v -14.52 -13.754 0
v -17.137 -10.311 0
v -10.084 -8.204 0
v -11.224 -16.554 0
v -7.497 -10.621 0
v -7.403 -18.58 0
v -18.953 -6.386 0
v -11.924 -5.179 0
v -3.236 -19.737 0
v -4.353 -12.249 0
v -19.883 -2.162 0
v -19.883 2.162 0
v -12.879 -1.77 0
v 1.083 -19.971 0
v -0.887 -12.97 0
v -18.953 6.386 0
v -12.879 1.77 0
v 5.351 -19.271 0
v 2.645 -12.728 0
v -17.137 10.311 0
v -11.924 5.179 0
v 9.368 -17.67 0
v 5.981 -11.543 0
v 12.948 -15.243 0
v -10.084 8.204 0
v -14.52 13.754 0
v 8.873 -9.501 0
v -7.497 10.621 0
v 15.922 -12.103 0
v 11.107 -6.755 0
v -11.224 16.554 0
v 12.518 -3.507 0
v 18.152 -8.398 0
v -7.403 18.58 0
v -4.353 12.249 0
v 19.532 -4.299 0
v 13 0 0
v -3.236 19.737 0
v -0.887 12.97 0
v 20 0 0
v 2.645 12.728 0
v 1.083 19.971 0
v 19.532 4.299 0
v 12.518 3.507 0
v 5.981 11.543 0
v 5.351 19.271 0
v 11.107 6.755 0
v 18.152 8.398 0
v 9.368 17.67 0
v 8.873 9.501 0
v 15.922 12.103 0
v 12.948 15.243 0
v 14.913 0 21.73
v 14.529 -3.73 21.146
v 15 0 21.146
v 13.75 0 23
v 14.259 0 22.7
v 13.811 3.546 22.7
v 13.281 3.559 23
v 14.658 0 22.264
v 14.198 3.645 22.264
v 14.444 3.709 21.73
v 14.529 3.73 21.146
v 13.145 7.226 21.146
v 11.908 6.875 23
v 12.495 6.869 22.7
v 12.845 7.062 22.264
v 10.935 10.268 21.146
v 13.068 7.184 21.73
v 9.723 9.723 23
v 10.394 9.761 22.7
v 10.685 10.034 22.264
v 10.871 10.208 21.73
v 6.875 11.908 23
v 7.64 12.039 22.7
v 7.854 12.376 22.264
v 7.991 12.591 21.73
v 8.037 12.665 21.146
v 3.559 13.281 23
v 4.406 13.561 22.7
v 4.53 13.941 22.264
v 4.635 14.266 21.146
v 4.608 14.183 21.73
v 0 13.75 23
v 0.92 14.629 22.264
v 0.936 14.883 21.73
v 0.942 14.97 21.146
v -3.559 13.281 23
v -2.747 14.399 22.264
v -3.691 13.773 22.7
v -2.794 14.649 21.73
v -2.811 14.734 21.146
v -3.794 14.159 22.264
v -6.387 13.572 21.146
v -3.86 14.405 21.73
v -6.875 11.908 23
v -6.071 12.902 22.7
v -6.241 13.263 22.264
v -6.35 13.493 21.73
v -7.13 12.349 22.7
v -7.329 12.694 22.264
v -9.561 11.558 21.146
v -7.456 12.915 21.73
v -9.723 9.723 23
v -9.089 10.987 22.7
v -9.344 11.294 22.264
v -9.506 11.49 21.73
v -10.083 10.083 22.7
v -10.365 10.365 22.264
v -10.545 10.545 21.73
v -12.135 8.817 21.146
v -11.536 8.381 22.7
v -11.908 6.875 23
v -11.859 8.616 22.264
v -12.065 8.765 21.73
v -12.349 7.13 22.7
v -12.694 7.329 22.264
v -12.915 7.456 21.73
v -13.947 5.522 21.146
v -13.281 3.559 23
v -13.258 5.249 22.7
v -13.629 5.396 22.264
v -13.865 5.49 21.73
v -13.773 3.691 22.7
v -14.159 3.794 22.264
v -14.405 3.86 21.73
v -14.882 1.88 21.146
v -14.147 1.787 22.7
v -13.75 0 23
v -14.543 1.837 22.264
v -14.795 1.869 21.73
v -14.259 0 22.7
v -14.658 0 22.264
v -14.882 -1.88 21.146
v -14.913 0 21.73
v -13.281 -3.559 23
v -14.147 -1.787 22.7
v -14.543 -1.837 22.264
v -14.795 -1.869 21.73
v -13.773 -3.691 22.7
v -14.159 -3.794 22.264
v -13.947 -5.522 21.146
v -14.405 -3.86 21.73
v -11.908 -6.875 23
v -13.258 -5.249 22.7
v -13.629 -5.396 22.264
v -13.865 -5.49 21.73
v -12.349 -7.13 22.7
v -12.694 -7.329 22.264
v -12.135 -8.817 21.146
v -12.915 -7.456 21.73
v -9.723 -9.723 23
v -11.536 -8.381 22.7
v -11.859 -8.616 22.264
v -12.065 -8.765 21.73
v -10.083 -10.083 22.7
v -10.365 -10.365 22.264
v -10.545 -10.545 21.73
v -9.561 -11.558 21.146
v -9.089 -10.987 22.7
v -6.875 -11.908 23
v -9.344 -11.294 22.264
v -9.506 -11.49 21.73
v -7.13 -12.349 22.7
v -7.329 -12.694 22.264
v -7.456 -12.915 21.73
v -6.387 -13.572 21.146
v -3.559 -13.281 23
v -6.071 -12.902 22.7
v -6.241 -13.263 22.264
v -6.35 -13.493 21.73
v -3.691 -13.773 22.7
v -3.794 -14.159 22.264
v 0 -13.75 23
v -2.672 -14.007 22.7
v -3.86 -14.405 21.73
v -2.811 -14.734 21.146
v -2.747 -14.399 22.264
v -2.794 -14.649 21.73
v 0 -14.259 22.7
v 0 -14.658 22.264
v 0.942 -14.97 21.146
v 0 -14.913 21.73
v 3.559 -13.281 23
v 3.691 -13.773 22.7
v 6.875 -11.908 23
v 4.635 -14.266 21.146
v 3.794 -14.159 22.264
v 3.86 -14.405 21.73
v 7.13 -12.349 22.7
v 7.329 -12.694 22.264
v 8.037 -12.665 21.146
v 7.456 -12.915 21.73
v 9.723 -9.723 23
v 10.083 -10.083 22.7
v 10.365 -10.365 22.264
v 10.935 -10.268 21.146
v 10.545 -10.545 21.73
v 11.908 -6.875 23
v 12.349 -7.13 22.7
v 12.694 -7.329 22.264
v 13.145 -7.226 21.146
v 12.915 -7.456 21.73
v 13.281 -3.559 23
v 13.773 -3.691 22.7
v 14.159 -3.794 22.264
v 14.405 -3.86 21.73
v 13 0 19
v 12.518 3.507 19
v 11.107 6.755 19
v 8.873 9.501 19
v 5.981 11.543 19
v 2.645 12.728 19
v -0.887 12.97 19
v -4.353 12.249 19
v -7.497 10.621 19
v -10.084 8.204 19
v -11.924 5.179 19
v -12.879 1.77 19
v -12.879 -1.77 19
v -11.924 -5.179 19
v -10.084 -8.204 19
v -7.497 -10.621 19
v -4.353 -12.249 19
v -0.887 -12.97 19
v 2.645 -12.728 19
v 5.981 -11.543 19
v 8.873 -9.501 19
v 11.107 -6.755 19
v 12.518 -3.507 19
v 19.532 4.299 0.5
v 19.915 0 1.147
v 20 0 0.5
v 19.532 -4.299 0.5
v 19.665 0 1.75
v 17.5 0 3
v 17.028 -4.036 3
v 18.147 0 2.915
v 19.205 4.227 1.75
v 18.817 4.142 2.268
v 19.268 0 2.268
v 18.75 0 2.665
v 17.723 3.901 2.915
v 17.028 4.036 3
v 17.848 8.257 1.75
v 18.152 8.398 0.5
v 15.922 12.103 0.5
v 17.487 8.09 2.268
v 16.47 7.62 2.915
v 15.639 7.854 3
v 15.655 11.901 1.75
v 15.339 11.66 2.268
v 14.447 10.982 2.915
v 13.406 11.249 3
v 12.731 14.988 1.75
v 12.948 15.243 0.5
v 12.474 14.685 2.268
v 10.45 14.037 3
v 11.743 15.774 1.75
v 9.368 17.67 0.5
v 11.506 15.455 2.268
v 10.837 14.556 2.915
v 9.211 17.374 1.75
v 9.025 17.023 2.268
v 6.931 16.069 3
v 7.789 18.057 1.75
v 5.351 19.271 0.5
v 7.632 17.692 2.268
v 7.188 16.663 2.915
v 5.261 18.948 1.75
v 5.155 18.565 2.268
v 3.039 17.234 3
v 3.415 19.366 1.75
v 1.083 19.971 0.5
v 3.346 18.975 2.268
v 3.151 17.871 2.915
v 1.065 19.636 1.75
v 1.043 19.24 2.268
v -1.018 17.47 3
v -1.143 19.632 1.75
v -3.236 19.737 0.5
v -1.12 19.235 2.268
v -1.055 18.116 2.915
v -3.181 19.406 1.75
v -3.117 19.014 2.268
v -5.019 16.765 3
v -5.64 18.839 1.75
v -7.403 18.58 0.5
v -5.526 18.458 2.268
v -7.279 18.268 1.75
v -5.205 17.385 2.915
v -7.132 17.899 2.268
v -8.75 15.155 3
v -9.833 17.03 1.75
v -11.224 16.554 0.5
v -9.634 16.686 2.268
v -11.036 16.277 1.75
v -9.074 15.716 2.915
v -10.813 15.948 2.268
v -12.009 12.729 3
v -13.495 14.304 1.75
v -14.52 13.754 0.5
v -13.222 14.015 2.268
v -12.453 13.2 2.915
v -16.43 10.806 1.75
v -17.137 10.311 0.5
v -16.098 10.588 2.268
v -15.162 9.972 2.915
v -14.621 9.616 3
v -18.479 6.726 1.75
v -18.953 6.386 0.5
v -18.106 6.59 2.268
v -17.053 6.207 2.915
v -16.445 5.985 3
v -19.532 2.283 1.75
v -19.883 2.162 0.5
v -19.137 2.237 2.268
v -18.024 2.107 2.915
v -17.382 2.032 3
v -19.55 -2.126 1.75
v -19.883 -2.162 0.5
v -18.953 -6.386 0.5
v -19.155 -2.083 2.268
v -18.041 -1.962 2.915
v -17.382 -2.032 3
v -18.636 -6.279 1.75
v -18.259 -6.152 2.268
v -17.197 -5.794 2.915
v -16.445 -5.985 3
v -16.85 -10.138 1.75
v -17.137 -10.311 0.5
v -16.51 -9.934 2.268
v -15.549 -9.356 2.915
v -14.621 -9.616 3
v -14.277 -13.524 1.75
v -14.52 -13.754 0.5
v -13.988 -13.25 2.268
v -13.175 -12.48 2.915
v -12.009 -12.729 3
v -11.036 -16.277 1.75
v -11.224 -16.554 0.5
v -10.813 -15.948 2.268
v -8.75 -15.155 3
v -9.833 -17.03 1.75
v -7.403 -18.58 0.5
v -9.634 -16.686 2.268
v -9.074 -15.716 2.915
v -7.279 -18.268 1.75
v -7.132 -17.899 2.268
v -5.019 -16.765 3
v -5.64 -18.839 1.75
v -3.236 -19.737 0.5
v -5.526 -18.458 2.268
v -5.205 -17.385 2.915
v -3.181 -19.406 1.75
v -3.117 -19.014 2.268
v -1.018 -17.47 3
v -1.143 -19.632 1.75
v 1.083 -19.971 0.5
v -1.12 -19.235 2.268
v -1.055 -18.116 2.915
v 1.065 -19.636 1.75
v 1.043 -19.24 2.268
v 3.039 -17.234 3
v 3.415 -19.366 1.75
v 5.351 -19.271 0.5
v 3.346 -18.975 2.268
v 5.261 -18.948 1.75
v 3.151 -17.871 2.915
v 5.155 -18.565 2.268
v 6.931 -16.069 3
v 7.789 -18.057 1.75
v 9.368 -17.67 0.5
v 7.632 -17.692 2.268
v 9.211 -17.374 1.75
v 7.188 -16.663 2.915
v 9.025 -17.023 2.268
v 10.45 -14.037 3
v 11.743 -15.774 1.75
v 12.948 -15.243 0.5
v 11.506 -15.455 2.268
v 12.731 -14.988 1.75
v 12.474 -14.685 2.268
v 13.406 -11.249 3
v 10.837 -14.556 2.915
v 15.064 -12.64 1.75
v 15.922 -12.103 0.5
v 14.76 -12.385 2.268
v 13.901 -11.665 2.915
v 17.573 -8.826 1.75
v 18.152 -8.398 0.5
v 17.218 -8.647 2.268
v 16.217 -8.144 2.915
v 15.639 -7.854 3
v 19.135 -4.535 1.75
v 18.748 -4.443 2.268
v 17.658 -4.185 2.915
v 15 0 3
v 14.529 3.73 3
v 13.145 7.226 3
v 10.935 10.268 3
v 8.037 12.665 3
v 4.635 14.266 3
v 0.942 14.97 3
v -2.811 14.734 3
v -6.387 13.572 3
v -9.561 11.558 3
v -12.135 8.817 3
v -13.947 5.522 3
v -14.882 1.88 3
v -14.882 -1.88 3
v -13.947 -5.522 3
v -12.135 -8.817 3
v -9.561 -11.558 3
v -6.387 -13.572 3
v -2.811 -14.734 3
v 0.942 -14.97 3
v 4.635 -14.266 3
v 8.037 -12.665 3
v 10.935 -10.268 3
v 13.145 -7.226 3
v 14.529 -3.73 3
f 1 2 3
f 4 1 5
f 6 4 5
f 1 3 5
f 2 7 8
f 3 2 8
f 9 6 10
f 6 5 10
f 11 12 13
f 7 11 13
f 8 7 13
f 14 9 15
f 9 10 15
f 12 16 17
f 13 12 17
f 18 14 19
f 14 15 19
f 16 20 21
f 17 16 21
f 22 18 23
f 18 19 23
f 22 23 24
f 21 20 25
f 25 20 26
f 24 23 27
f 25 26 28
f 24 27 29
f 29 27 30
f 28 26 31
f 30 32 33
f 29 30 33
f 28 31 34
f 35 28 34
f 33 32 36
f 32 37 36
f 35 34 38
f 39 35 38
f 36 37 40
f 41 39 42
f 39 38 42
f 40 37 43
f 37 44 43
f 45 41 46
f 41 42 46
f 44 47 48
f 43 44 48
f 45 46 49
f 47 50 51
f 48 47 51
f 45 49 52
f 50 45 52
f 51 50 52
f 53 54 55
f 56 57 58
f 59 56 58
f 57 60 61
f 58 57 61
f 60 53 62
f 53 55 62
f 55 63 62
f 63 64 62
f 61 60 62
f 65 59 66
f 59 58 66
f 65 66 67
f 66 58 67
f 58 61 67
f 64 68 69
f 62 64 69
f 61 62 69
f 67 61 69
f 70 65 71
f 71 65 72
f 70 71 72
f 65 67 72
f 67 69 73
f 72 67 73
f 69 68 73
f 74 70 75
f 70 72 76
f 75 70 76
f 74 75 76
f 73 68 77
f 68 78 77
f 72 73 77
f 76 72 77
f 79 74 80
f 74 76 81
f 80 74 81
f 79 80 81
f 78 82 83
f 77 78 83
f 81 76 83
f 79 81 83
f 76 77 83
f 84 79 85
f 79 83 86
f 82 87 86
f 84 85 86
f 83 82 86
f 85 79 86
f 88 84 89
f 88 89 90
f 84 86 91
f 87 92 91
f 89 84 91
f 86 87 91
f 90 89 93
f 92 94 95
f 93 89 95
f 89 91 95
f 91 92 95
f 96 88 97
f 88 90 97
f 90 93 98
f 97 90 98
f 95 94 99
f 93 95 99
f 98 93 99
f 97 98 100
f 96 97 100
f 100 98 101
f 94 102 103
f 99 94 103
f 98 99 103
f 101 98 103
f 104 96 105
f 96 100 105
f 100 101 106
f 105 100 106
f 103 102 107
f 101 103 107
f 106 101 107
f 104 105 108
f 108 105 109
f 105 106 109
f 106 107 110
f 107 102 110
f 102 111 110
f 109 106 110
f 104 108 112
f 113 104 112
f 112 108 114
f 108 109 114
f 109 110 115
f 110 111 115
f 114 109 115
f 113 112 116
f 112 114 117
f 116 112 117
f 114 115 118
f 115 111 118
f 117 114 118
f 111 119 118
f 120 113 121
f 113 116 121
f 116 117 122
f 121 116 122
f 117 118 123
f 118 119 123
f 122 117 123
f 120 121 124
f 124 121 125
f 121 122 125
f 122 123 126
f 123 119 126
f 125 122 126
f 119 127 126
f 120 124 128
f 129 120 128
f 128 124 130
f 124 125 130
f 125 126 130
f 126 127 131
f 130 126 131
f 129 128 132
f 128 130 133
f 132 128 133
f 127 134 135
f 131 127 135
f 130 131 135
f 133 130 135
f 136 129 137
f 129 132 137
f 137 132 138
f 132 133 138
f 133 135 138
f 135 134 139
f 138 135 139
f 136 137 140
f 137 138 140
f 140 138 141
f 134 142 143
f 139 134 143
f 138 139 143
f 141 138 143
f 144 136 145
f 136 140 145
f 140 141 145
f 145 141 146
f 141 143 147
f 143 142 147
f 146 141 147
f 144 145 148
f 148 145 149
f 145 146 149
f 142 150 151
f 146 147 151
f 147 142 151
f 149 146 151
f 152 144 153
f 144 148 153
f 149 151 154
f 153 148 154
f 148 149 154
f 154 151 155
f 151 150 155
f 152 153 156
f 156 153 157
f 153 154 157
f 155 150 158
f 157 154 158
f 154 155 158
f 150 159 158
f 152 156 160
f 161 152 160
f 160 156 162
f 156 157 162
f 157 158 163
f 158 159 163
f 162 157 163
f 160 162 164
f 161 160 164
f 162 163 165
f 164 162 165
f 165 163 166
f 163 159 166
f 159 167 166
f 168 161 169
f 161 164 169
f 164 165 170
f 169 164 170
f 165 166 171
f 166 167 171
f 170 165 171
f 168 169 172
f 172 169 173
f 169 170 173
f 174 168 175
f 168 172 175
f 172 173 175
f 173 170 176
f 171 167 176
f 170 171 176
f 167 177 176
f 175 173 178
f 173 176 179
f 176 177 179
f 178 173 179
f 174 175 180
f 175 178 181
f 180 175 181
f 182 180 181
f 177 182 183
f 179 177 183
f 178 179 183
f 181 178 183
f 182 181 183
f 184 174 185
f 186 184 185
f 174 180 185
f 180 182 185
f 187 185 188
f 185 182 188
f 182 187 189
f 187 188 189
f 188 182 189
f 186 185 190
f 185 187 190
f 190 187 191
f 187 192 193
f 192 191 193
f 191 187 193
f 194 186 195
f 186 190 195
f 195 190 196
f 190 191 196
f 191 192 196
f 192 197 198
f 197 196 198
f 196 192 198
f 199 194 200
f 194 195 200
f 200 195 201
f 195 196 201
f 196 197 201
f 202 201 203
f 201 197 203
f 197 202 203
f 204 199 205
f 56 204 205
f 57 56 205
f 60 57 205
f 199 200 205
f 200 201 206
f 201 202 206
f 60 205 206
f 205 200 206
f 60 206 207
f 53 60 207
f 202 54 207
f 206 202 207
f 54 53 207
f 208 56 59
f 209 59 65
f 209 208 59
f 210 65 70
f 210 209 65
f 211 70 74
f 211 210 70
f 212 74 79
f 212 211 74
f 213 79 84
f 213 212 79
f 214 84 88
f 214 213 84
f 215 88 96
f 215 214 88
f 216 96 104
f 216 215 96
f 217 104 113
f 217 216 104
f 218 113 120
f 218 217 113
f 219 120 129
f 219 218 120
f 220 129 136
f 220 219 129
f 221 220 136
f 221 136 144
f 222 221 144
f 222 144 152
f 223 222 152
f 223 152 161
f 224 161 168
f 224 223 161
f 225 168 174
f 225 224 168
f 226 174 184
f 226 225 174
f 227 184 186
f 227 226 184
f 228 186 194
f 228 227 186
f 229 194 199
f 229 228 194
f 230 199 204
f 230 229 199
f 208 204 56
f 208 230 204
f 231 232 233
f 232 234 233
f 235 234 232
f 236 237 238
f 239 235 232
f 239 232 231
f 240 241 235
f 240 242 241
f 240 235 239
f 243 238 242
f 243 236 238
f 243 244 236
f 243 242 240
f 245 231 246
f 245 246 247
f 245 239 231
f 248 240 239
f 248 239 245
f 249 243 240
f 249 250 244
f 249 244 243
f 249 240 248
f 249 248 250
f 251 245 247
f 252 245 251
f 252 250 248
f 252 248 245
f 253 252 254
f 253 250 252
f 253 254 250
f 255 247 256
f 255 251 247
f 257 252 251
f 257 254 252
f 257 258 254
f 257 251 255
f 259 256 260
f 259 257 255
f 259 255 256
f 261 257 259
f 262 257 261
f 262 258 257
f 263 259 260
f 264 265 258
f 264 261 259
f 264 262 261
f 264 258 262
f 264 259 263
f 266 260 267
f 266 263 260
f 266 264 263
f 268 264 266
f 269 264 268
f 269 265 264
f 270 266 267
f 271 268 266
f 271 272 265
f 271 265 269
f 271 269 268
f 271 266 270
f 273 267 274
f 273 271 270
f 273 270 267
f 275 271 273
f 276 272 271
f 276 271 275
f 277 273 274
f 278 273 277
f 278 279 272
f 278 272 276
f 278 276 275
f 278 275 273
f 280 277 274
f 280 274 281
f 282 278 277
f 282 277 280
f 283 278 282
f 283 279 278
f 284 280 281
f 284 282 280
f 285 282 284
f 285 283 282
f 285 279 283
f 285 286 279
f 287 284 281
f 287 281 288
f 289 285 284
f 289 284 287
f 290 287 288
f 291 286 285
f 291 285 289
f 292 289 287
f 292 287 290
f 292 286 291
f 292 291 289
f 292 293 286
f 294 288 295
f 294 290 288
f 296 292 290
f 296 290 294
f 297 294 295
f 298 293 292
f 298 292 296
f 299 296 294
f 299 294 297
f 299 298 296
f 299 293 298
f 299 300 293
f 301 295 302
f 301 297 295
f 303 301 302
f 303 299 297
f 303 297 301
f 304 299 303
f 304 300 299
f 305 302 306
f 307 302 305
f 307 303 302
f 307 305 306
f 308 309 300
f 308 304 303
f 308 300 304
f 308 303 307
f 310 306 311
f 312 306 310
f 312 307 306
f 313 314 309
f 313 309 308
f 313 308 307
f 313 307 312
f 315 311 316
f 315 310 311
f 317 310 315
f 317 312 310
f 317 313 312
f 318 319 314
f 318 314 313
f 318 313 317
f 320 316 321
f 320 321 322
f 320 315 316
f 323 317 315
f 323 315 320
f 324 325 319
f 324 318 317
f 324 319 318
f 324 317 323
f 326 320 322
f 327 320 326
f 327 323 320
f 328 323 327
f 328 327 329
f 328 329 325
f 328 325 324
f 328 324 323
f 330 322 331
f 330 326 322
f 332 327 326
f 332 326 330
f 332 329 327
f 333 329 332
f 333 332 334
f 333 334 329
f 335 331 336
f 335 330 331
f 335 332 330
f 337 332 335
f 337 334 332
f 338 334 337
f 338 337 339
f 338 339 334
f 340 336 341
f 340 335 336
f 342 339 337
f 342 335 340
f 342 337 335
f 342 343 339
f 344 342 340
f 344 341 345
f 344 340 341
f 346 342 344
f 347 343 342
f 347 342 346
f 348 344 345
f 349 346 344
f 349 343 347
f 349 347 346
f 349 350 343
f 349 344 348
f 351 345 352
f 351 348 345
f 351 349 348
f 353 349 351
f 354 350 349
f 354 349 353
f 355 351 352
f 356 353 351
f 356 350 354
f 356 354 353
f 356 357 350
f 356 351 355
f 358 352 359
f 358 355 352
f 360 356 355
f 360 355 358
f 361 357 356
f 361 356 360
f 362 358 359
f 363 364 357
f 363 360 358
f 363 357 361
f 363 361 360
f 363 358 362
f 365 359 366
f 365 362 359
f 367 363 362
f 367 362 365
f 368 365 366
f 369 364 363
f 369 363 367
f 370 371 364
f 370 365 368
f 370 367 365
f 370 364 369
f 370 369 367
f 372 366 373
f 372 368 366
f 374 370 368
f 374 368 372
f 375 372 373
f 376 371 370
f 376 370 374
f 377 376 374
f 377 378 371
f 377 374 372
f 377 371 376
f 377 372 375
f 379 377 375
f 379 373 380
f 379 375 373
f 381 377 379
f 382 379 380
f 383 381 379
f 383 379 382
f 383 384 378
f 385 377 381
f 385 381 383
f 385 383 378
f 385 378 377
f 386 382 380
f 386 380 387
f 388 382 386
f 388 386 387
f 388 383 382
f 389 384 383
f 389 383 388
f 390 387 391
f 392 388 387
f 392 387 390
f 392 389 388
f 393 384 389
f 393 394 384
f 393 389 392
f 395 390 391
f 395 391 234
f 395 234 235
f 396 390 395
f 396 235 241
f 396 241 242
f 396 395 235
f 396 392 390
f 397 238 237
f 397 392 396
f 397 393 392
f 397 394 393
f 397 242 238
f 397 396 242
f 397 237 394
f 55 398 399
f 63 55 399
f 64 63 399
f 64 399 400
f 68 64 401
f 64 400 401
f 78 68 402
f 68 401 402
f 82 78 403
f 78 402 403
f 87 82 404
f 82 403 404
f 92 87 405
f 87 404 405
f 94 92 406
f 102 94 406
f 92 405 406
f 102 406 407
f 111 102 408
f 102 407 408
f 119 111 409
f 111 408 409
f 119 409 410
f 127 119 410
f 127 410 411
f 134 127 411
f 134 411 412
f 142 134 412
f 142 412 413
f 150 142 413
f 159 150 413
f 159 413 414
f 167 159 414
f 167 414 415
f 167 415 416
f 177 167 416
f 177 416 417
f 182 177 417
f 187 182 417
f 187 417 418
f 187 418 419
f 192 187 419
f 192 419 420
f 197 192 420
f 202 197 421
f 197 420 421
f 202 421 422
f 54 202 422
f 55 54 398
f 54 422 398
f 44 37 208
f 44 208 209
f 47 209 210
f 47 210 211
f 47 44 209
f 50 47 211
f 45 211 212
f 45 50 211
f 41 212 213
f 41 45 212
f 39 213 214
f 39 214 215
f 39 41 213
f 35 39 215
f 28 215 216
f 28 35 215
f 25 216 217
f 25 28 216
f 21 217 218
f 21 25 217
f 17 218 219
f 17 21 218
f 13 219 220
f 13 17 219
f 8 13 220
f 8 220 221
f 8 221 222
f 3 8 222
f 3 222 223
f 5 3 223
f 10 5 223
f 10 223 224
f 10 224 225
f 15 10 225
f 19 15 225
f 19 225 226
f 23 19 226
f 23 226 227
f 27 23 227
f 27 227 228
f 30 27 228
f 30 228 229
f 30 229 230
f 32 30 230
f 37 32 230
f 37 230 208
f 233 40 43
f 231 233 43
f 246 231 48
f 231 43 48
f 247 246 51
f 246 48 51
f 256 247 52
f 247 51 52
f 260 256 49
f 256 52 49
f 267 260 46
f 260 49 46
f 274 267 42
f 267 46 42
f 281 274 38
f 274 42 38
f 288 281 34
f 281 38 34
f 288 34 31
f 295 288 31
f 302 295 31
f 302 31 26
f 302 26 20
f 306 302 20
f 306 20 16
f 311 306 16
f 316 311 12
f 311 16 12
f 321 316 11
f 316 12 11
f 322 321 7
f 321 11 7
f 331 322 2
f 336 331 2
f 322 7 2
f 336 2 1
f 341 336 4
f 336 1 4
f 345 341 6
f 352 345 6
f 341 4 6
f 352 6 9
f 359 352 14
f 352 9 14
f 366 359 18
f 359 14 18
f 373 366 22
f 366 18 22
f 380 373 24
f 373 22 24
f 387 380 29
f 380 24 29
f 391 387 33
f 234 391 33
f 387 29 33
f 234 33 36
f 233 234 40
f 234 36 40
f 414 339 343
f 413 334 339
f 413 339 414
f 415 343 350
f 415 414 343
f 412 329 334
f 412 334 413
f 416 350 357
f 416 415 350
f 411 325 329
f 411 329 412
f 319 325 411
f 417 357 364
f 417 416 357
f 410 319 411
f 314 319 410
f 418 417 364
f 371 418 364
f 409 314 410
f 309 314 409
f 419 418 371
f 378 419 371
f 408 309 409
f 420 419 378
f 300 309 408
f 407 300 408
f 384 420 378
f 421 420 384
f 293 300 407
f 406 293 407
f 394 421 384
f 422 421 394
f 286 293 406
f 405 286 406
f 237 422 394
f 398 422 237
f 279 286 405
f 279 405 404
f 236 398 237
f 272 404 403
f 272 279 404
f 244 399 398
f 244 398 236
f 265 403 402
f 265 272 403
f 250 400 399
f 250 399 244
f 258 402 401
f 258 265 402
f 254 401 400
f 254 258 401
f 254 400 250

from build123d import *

# Parameters (mm, degrees)
F0_R     = 20
F0_R_2   = 13
F1_DEPTH = 3
F2_R     = 15
F2_R_2   = 13
F3_DEPTH = 20
F4_R     = 2.5
F5_SIZE2 = 4
F5_SIZE  = 0.75


# Not quite as in the source:
# - a fillet or chamfer that OpenCascade refuses, or shapes differently, is made with other operations: its cross-section is extruded or revolved along the edge and cut away or added


with BuildPart() as f1:
    # F0 (on Top) → F1 (new body)
    with BuildSketch(Plane.XY):
        Circle(F0_R)
        Circle(F0_R_2, mode=Mode.SUBTRACT)
    extrude(amount=F1_DEPTH)

    # F2 (on face) → F3 (join)
    with BuildSketch(Plane.XY.offset(3)):
        Circle(F2_R)
        Circle(F2_R_2, mode=Mode.SUBTRACT)
    extrude(amount=F3_DEPTH)

    # F4
    f4_edges = [f1.edges().sort_by_distance(p)[0] for p in [
        (-20, 0, 3),
    ]]
    fillet(f4_edges, radius=F4_R)

    # F5
    f5_edges = [f1.edges().sort_by_distance(p)[0] for p in [
        (-13, 0, 23),
    ]]
    f5_side = f1.faces().sort_by_distance((-14.575736, 0, 23))[0]
    chamfer(f5_edges, length=F5_SIZE, length2=F5_SIZE2, reference=f5_side)

    # F6: fillet of radius 2 on 1 edges, made by hand

    # F6_s1 → F6_t2 (revolve, cut)
    with BuildSketch(Plane.XZ):
        with BuildLine():
            ThreePointArc((13.75, 23), (14.6583123952, 22.263984367), (15, 21.1459503782))
            Line((15, 21.1459503782), (15, 23))
            Line((15, 23), (13.75, 23))
        make_face()
    revolve(axis=Axis((0, 0, 23), (0, 0, 1)), mode=Mode.SUBTRACT)


solid = f1.part
